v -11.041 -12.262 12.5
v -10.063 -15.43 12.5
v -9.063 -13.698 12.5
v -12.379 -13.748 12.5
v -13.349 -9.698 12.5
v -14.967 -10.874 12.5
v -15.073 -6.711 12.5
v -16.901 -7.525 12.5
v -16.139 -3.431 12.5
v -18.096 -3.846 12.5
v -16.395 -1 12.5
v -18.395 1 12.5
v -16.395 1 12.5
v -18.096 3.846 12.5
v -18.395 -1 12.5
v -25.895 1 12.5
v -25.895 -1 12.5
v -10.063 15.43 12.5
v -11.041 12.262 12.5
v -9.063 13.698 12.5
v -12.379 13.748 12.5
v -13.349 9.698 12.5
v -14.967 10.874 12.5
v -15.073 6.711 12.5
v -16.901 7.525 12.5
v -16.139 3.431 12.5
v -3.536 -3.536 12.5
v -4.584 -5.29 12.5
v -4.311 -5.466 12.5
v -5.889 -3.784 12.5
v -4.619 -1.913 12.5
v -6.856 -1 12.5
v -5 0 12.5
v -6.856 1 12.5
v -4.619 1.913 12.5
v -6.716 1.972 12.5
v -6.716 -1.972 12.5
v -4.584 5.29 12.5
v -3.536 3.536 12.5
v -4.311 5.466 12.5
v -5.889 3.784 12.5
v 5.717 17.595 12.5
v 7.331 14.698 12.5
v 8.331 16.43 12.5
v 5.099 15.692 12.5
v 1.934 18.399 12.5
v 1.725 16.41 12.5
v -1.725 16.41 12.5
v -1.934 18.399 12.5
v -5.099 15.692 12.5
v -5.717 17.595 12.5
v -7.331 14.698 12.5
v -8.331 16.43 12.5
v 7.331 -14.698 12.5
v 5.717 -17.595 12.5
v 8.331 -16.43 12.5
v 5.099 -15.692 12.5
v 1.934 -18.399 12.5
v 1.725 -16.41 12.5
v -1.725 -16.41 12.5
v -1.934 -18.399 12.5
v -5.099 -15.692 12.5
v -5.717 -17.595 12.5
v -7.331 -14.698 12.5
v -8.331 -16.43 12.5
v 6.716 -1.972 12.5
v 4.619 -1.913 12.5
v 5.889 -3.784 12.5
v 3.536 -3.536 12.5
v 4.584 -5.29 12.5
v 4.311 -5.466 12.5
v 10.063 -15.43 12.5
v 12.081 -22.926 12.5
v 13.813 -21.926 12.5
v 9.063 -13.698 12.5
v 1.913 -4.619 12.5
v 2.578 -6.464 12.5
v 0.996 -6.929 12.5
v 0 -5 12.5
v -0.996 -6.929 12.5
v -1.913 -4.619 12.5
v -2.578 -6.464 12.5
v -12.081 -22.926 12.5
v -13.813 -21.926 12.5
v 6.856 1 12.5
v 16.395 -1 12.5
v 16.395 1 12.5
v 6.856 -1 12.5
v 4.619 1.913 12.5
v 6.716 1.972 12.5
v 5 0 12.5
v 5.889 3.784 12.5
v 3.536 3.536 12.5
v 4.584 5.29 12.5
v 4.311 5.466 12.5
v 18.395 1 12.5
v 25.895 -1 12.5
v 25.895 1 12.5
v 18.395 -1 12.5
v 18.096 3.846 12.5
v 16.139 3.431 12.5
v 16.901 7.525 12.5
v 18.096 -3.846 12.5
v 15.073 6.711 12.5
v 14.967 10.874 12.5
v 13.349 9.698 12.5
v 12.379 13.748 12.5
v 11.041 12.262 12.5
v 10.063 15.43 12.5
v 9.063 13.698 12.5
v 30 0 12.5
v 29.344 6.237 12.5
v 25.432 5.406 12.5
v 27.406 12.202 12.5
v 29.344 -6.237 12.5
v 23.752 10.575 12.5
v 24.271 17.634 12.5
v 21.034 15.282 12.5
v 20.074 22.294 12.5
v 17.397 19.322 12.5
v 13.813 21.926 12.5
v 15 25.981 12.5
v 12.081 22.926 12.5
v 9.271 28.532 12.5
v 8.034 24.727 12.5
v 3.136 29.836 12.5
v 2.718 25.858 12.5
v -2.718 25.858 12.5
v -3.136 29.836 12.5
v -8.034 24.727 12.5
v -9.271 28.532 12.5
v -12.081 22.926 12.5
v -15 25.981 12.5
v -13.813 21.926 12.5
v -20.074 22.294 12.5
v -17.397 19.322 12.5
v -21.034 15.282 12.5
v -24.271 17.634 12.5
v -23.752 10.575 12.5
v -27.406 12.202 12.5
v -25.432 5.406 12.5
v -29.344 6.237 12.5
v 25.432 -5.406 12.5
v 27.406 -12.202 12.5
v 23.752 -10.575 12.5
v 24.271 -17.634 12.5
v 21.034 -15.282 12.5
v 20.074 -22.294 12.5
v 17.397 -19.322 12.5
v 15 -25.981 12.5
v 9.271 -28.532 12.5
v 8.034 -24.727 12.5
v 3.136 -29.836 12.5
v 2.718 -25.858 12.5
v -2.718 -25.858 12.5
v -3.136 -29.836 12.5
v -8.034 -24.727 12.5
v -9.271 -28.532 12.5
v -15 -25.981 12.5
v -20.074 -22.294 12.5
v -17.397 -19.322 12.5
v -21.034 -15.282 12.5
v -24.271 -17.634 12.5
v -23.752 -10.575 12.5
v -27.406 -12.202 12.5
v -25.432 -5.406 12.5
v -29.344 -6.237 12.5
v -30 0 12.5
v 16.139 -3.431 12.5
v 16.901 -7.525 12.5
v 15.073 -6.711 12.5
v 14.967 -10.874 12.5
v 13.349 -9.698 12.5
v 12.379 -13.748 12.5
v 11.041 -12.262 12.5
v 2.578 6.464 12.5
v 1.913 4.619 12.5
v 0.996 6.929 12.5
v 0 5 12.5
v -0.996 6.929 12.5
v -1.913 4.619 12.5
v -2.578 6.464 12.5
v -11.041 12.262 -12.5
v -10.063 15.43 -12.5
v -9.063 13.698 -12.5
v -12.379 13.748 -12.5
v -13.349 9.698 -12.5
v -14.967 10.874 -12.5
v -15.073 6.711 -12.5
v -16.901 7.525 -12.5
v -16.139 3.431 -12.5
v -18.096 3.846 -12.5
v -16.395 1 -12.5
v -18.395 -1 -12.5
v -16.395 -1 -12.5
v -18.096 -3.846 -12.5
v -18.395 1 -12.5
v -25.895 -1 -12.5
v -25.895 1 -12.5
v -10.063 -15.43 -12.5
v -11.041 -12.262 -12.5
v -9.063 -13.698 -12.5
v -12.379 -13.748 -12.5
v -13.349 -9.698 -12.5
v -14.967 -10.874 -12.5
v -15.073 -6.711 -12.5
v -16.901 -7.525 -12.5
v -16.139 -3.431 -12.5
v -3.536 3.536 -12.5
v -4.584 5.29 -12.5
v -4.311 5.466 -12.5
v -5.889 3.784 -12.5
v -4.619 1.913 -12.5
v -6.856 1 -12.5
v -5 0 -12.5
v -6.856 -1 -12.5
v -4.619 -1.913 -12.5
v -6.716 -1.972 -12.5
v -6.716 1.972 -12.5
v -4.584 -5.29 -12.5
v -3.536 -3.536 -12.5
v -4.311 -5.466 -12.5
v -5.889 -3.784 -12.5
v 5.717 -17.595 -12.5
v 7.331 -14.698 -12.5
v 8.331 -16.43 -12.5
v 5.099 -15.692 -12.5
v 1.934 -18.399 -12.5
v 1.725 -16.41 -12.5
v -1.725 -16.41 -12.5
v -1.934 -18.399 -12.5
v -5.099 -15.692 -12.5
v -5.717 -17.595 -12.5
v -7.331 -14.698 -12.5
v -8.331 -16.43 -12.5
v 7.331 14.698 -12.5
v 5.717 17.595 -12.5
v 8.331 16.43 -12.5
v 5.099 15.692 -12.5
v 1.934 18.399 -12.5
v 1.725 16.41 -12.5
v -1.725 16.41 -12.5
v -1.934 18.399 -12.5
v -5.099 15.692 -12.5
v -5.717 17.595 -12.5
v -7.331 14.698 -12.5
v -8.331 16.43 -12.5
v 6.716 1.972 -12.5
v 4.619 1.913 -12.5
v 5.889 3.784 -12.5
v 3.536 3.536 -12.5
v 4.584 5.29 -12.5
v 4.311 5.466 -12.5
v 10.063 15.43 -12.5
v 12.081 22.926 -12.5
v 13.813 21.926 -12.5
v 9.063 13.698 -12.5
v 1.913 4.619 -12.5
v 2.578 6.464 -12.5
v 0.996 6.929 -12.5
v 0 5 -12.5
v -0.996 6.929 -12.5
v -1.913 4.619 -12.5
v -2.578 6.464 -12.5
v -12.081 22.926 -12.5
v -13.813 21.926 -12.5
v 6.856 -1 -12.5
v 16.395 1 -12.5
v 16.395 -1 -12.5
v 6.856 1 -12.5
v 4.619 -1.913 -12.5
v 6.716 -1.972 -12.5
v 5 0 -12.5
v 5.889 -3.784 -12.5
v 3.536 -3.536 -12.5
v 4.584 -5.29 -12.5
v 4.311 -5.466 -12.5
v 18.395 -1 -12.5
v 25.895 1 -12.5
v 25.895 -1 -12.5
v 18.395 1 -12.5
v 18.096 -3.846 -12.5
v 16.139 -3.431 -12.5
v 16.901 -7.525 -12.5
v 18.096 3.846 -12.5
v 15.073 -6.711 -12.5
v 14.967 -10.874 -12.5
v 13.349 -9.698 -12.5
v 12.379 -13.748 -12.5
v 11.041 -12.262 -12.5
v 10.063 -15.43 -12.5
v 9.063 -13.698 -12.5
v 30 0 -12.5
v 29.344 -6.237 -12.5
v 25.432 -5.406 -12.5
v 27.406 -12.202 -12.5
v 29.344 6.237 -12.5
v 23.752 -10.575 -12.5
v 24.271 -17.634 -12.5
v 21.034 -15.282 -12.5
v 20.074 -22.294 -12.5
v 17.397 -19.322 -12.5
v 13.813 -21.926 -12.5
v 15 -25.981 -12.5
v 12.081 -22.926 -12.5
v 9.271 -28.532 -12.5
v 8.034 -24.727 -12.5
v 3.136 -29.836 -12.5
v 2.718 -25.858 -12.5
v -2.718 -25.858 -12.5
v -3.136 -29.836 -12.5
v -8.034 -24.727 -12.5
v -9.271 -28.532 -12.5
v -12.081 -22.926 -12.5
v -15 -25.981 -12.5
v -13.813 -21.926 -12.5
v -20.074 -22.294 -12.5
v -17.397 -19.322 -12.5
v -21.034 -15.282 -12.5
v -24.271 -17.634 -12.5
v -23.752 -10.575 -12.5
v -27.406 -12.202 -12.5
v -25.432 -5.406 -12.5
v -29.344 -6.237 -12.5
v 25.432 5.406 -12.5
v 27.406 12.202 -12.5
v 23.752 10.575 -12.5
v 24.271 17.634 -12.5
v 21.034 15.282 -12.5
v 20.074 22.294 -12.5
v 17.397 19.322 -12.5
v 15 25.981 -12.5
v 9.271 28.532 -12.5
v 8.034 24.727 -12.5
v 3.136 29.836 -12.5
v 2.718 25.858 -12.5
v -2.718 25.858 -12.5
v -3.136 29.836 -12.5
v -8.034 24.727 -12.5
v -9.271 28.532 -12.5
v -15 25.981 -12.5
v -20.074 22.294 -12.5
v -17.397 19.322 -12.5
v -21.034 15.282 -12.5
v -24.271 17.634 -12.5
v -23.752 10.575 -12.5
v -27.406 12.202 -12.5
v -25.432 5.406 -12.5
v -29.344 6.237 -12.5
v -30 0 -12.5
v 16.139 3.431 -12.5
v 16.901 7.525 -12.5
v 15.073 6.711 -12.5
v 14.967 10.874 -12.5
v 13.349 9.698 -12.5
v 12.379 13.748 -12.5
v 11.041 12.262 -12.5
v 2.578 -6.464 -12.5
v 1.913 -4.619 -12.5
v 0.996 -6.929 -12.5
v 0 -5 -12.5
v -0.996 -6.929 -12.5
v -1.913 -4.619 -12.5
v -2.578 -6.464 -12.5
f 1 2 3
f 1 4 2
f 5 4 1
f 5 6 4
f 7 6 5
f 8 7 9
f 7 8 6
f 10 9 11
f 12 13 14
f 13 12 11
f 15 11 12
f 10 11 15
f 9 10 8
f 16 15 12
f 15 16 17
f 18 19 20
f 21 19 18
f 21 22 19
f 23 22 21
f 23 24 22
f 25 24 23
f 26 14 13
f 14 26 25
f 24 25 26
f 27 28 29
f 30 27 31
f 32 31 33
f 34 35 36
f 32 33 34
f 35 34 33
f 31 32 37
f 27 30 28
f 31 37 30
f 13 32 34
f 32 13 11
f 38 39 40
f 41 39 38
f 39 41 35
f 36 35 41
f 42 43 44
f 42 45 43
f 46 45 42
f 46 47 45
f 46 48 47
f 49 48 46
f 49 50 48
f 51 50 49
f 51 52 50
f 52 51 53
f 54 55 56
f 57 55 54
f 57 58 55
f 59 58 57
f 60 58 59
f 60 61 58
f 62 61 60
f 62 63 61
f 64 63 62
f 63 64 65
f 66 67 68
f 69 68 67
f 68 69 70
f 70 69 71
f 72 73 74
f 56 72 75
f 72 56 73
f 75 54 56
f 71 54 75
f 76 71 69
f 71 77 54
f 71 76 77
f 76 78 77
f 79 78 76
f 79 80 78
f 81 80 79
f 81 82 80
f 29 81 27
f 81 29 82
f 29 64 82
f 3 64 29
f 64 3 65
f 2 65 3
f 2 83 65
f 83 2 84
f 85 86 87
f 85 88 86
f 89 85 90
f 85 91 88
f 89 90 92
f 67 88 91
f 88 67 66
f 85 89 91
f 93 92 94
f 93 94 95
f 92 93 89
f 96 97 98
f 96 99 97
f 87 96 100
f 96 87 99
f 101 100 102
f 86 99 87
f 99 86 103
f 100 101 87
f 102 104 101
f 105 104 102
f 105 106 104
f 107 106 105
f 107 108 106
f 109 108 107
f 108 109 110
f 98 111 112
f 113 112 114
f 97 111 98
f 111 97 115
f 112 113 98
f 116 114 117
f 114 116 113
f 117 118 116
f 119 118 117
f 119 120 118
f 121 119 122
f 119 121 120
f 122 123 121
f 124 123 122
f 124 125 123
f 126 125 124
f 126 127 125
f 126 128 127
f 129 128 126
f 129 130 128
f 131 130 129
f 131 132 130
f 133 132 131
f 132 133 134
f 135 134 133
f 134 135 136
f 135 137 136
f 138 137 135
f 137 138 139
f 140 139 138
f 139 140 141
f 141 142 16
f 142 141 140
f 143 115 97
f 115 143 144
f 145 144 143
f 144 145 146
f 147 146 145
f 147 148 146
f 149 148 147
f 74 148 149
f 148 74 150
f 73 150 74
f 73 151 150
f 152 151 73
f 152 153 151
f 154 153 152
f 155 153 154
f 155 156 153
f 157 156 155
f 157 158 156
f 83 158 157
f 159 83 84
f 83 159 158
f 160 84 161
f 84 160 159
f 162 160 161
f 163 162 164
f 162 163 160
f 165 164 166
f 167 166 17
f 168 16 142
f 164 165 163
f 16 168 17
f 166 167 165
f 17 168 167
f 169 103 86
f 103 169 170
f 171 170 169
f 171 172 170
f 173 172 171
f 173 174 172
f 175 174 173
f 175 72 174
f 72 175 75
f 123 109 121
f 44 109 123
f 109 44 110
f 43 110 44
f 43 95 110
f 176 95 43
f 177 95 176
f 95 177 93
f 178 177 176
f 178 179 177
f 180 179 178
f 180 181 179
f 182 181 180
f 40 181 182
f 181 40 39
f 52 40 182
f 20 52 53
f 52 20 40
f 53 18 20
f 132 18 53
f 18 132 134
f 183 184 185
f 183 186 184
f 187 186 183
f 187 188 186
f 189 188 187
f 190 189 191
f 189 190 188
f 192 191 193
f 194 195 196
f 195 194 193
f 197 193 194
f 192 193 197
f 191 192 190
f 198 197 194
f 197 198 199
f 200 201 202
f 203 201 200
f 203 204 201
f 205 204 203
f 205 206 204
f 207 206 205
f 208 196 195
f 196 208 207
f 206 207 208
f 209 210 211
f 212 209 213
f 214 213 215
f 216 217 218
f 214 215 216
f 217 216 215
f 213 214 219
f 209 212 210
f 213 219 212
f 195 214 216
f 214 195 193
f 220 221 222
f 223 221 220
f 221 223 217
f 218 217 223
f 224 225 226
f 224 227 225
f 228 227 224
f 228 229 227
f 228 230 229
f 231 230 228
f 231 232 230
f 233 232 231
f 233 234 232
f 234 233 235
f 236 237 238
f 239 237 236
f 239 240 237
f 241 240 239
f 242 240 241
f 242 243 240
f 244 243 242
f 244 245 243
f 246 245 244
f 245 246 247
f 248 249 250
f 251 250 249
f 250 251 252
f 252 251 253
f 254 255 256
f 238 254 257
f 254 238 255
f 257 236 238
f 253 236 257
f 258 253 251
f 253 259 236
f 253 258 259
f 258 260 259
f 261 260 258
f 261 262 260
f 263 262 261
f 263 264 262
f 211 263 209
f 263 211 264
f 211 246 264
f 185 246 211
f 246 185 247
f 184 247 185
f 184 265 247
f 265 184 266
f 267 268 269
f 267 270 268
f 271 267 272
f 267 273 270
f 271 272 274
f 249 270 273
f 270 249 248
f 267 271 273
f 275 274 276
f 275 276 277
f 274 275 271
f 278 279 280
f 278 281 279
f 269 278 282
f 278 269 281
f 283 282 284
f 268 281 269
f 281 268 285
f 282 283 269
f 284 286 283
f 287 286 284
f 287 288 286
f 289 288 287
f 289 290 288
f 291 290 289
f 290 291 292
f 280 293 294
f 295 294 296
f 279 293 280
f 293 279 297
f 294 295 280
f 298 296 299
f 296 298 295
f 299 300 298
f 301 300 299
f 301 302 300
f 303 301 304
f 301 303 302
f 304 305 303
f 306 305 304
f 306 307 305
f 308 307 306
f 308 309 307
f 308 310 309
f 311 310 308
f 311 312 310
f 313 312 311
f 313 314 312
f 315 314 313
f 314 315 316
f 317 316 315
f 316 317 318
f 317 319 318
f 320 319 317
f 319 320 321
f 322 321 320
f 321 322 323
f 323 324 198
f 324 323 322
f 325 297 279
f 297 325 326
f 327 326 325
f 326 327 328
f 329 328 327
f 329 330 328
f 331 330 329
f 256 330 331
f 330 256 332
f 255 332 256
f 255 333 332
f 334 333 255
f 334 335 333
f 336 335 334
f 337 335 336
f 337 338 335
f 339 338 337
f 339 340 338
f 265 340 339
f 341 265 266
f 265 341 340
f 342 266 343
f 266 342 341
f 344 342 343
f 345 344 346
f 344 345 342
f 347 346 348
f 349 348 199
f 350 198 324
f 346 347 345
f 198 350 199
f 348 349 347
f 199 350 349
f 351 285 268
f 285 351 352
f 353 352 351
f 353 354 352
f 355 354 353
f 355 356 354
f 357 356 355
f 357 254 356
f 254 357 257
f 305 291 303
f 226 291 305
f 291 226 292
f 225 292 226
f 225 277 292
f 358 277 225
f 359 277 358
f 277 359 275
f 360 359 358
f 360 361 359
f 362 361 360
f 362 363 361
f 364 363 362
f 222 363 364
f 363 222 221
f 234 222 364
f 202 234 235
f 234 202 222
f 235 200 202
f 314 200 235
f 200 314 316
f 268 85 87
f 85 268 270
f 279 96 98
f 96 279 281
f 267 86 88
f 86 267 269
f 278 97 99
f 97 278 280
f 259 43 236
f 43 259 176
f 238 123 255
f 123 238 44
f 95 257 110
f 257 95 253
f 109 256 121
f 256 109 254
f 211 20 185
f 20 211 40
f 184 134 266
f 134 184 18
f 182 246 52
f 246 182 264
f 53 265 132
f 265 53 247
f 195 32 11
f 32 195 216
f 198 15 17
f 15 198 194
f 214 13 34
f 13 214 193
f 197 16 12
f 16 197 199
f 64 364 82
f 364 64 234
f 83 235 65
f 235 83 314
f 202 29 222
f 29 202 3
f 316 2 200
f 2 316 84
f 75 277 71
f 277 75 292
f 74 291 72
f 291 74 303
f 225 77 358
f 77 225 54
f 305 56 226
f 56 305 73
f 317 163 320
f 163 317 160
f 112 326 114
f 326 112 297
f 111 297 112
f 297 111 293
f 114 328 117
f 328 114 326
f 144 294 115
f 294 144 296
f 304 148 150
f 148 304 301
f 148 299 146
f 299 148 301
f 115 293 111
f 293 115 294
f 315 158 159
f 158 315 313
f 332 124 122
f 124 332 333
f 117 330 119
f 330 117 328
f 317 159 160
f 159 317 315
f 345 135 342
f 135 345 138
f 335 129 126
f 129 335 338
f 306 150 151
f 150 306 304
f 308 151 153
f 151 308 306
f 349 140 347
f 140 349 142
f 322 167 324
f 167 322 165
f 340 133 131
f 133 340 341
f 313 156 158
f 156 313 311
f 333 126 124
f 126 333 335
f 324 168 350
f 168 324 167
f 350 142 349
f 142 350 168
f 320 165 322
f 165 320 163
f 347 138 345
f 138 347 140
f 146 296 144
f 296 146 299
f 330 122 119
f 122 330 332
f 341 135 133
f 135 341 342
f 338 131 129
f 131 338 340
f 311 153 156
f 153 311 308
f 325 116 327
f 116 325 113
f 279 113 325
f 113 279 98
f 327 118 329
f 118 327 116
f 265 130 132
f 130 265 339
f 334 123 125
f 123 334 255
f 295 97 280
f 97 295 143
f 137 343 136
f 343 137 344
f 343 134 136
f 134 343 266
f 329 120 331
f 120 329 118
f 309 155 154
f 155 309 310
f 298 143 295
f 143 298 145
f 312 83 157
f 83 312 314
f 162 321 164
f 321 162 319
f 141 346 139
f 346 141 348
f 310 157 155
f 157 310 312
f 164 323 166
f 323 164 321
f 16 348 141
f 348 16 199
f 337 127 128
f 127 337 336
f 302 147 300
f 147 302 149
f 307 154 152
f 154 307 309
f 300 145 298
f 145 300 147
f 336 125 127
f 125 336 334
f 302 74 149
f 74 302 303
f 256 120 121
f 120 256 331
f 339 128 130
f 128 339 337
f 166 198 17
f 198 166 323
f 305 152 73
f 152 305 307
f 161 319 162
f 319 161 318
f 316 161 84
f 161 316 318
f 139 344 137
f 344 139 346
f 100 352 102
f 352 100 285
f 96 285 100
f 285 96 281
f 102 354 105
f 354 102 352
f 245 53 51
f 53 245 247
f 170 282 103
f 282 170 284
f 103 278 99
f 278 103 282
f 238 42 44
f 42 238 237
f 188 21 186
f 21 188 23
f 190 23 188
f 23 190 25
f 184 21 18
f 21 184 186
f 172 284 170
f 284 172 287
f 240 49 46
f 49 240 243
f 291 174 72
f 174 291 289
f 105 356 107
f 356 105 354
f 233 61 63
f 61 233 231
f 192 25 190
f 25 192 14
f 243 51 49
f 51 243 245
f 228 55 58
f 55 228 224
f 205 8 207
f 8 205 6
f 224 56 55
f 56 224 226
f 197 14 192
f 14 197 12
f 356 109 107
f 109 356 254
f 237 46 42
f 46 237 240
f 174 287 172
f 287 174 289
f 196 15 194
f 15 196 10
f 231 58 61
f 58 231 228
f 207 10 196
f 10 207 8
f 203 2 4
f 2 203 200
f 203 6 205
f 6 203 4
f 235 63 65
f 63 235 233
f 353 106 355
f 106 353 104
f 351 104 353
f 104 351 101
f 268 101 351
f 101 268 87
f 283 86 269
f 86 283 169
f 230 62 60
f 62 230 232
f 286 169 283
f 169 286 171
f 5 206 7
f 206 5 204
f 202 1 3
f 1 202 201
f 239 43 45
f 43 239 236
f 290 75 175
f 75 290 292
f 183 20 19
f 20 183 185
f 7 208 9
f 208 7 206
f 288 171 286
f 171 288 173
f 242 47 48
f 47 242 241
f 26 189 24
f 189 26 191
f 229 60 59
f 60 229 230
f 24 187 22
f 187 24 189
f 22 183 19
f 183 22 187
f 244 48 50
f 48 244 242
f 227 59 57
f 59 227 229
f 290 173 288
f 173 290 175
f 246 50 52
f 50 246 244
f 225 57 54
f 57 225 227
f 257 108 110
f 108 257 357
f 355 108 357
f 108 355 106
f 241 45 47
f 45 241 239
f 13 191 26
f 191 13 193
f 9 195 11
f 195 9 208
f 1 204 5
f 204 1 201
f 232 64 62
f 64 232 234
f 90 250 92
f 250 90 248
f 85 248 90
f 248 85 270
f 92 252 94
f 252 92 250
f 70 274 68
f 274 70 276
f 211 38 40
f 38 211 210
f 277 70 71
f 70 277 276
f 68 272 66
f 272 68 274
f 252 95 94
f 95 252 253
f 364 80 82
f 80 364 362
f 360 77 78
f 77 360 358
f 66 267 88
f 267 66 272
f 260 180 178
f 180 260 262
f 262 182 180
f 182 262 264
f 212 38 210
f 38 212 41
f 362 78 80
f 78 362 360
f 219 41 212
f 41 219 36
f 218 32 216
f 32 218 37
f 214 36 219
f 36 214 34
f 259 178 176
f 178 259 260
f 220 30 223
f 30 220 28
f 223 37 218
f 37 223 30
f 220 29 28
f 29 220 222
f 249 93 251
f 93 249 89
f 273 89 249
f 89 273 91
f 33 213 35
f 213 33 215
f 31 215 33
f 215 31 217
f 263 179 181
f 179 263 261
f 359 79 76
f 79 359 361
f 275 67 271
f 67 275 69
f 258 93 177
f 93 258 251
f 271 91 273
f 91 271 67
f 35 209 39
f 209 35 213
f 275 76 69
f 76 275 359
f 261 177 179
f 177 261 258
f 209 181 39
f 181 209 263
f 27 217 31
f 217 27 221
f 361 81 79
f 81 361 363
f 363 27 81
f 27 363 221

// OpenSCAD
//Customizable Crush Tube
//by eriqjo, March 2016


//CUSTOMIZER VARIABLES

//Height of tube, mm
Tube_Height = 25;

//Diameter of center hole, mm
Hole_Diameter = 10;

//Width of inner ring, mm
Inner_Width = 4;

//Outer diameter of tube, mm
Outer_Diameter = 60;

//Width of outer rings, mm
Outer_Width = 4;

//Number of spokes
Spoke_Quantity = 6; // [3:18]

//Width of spokes, mm
Spoke_Width = 2;

//Number of additional rings
Additional_Rings = 1;

//Width of additional rings, mm
Add_Ring_Width = 2;

//CUSTOMIZER VARIABLES END

errorFree = false;
errorFree = true;

if (errorFree){
	difference(){
		union(){
			spokes();
			outerRing();
			extraRings();
			centerRing();
		}//union
		centerHole();
	}//diff
}//if

else{
	//TODO error messages here
}//else

module spokes(){
	spokeAngle = 360/Spoke_Quantity;
	for (i=[0:Spoke_Quantity-1]){
		rotate([0, 0, i*spokeAngle])
			translate([((Outer_Diameter/2)-(Outer_Width/2))/2, 0, 0])
				cube([(Outer_Diameter/2)-(Outer_Width/2), Spoke_Width, Tube_Height], center = true);
	}//for
}//module spokes

module outerRing(){
	difference(){
		cylinder(h = Tube_Height, d = Outer_Diameter, center = true);
		cylinder(h = Tube_Height + 1, d = Outer_Diameter - (2 * Outer_Width), center = true);
	}//difference
}//module outerRing

module extraRings(){
	dimA = (Hole_Diameter/2) + Inner_Width;
	dimB = (Outer_Diameter/2) - dimA - Outer_Width;
	dimR = (dimB/(Additional_Rings + 1));
	if (Additional_Rings > 0){
		for(i = [1 : Additional_Rings]){
			difference(){
				cylinder(h = Tube_Height, r = dimA + i*dimR + Add_Ring_Width/2, center = true);
				cylinder(h = Tube_Height + 1, r = dimA + i*dimR - Add_Ring_Width/2, center = true);
			}//difference
		}//for
	}//if
}//module extraRings

module centerRing(){
	cylinder(h = Tube_Height, d = Hole_Diameter + Inner_Width, center = true);
}//module centerRing

module centerHole(){
	cylinder(h = Tube_Height + 1, d = Hole_Diameter, center = true);
}//module centerHole
